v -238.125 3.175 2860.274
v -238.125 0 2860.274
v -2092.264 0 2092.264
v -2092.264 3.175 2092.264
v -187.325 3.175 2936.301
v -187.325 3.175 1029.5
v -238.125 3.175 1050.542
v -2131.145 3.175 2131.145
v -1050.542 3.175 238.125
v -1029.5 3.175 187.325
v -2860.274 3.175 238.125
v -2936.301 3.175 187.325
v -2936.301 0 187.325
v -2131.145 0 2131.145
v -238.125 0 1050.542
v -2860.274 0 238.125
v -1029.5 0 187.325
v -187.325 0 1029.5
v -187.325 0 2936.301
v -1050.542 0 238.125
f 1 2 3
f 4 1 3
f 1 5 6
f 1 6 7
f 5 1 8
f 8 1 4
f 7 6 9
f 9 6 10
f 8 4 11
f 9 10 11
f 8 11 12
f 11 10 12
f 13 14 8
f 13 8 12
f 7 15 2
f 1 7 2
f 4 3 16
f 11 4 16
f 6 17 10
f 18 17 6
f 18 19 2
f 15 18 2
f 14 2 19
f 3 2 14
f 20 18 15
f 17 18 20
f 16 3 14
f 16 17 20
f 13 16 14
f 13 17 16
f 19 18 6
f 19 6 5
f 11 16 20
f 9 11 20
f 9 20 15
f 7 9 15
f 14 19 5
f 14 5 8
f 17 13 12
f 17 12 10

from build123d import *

# Parameters (mm, degrees)
BOSS_EXTRUDE1_DEPTH = 3.175


with BuildPart() as part:
    # Sketch1 → Boss-Extrude1 (new body)
    with BuildSketch(Plane(origin=(0, 0, 0), x_dir=(1, 0, 0), z_dir=(0, 1, 0))):
        Polygon((-1029.499704405, -187.325), (-187.325, -1029.499704405), (-187.325, -2936.301466338), (-2131.14490067, -2131.14490067), (-2936.301466338, -187.325), align=None)
        Polygon((-238.125, -1050.541753373), (-238.125, -2860.273893594), (-2092.264263941, -2092.264263941), (-2860.273893594, -238.125), (-1050.541753373, -238.125), align=None, mode=Mode.SUBTRACT)
    extrude(amount=BOSS_EXTRUDE1_DEPTH)


solid = part.part
